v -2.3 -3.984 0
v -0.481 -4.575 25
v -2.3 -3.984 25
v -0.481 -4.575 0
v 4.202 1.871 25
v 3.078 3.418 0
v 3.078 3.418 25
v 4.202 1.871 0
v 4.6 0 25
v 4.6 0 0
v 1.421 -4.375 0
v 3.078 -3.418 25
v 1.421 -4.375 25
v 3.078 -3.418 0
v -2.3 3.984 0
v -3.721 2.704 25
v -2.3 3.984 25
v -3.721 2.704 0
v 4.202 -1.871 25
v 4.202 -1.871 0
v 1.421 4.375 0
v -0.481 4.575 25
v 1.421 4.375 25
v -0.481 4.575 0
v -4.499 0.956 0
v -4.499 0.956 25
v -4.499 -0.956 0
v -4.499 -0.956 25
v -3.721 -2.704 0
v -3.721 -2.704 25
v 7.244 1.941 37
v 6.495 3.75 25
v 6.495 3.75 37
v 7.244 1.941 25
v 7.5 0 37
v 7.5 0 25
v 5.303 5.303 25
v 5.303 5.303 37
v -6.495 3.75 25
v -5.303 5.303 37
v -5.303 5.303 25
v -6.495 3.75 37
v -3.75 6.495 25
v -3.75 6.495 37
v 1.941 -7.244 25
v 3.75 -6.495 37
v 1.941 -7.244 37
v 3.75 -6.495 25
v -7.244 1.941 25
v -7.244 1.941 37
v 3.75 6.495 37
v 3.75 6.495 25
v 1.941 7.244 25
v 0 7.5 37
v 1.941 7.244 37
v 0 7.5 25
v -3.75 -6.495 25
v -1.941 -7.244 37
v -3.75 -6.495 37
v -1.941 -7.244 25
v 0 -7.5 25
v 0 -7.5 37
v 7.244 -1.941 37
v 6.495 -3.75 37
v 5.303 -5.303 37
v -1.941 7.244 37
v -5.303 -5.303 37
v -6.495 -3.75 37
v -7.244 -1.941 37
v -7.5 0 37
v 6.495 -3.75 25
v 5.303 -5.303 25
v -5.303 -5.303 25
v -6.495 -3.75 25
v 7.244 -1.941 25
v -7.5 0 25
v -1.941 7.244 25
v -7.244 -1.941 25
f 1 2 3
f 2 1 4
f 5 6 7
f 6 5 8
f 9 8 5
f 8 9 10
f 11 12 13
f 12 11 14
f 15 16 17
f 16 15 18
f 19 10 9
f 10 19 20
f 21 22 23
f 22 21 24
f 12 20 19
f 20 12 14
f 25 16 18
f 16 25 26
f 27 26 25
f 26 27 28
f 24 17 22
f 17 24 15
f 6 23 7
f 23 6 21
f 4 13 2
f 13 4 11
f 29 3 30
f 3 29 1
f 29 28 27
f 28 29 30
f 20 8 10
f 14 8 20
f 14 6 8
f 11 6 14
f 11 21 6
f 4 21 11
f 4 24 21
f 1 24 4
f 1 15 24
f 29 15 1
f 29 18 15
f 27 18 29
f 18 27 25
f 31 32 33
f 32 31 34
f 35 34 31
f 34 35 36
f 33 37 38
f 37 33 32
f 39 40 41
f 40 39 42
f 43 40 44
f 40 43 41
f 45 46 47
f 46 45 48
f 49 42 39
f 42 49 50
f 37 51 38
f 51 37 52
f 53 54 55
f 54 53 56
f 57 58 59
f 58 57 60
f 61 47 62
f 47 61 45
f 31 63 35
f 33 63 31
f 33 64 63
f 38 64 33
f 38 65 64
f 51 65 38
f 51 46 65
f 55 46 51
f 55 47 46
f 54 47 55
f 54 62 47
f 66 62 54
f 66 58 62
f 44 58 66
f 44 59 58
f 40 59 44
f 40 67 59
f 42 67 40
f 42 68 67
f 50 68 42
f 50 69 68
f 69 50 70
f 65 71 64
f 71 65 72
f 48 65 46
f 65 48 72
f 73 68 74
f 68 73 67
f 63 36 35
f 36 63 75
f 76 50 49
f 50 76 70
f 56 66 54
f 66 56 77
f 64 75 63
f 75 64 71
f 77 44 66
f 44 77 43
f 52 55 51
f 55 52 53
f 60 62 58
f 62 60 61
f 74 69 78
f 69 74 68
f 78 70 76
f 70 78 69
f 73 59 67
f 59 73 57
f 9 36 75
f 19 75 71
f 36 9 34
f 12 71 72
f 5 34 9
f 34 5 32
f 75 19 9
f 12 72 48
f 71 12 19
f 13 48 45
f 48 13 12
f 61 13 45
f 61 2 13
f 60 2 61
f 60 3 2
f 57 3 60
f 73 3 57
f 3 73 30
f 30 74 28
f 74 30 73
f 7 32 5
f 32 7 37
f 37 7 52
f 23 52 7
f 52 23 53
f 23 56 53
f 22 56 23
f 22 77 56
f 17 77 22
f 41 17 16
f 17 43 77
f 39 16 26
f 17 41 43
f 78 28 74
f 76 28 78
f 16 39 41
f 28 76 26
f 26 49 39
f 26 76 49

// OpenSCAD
cylinder(h=27, d=9.2);
translate([0,0,25]){
    cylinder(h=12, d=15);
}
